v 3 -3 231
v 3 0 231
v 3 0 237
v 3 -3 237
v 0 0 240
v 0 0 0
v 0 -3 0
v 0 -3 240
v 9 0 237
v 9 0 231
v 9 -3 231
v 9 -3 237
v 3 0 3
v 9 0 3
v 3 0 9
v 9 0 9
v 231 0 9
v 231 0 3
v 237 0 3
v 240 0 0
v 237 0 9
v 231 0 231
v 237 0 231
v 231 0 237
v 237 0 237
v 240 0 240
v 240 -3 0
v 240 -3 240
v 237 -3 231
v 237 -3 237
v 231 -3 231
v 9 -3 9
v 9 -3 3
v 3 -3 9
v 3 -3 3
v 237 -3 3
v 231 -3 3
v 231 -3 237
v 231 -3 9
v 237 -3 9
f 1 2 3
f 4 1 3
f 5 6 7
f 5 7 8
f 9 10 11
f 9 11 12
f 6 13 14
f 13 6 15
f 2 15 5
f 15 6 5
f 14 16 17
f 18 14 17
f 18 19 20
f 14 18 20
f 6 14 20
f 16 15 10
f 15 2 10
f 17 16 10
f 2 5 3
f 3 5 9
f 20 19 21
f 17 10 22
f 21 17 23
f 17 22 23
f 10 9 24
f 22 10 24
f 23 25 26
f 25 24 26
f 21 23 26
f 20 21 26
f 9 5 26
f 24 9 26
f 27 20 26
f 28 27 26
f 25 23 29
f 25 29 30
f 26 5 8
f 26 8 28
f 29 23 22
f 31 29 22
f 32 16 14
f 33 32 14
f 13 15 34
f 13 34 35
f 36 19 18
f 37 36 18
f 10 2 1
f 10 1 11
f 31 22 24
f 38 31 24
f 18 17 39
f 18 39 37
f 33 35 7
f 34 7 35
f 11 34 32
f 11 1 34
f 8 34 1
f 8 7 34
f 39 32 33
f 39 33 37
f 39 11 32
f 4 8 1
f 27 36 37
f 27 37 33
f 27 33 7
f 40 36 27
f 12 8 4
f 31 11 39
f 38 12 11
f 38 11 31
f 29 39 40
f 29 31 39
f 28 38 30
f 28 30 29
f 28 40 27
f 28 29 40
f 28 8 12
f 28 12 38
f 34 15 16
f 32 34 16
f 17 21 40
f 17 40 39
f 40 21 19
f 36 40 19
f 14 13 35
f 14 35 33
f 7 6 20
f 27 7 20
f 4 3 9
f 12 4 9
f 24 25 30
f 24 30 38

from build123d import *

# Parameters (mm, degrees)
F1_W     = 240
F1_H     = 240
F1_W_2   = 6
F1_H_2   = 6
F2_DEPTH = 3
F3_DEPTH = 25


with BuildPart() as f2:
    # F1 (on Front) → F2 (new body)
    with BuildSketch(Plane.XZ):
        with Locations((120, 120)):
            Rectangle(F1_W, F1_H)
        with Locations((6, 234)):
            Rectangle(F1_W_2, F1_H_2, mode=Mode.SUBTRACT)
        with Locations((6, 234)):
            Rectangle(F1_W_2, F1_H_2)
    extrude(amount=F2_DEPTH)

    # F1 (on Front) → F3 (cut)
    with BuildSketch(Plane.XZ):
        with Locations((6, 234)):
            Rectangle(F1_W_2, F1_H_2)
    extrude(amount=F3_DEPTH, mode=Mode.SUBTRACT)

    # F5: F2 across plane


with BuildPart() as f2_1:
    add(f2.part)
    add(f2.part.mirror(Plane(origin=(120, -1.5, 120), x_dir=(0, -1, 0), z_dir=(-1, 0, 0))), mode=Mode.INTERSECT)

    # F7: F2 across plane


with BuildPart() as f2_2:
    add(f2_1.part)
    add(f2_1.part.mirror(Plane(origin=(120, -1.5, 120), x_dir=(1, 0, 0), z_dir=(0, 0, 1))), mode=Mode.INTERSECT)


solid = f2_2.part
